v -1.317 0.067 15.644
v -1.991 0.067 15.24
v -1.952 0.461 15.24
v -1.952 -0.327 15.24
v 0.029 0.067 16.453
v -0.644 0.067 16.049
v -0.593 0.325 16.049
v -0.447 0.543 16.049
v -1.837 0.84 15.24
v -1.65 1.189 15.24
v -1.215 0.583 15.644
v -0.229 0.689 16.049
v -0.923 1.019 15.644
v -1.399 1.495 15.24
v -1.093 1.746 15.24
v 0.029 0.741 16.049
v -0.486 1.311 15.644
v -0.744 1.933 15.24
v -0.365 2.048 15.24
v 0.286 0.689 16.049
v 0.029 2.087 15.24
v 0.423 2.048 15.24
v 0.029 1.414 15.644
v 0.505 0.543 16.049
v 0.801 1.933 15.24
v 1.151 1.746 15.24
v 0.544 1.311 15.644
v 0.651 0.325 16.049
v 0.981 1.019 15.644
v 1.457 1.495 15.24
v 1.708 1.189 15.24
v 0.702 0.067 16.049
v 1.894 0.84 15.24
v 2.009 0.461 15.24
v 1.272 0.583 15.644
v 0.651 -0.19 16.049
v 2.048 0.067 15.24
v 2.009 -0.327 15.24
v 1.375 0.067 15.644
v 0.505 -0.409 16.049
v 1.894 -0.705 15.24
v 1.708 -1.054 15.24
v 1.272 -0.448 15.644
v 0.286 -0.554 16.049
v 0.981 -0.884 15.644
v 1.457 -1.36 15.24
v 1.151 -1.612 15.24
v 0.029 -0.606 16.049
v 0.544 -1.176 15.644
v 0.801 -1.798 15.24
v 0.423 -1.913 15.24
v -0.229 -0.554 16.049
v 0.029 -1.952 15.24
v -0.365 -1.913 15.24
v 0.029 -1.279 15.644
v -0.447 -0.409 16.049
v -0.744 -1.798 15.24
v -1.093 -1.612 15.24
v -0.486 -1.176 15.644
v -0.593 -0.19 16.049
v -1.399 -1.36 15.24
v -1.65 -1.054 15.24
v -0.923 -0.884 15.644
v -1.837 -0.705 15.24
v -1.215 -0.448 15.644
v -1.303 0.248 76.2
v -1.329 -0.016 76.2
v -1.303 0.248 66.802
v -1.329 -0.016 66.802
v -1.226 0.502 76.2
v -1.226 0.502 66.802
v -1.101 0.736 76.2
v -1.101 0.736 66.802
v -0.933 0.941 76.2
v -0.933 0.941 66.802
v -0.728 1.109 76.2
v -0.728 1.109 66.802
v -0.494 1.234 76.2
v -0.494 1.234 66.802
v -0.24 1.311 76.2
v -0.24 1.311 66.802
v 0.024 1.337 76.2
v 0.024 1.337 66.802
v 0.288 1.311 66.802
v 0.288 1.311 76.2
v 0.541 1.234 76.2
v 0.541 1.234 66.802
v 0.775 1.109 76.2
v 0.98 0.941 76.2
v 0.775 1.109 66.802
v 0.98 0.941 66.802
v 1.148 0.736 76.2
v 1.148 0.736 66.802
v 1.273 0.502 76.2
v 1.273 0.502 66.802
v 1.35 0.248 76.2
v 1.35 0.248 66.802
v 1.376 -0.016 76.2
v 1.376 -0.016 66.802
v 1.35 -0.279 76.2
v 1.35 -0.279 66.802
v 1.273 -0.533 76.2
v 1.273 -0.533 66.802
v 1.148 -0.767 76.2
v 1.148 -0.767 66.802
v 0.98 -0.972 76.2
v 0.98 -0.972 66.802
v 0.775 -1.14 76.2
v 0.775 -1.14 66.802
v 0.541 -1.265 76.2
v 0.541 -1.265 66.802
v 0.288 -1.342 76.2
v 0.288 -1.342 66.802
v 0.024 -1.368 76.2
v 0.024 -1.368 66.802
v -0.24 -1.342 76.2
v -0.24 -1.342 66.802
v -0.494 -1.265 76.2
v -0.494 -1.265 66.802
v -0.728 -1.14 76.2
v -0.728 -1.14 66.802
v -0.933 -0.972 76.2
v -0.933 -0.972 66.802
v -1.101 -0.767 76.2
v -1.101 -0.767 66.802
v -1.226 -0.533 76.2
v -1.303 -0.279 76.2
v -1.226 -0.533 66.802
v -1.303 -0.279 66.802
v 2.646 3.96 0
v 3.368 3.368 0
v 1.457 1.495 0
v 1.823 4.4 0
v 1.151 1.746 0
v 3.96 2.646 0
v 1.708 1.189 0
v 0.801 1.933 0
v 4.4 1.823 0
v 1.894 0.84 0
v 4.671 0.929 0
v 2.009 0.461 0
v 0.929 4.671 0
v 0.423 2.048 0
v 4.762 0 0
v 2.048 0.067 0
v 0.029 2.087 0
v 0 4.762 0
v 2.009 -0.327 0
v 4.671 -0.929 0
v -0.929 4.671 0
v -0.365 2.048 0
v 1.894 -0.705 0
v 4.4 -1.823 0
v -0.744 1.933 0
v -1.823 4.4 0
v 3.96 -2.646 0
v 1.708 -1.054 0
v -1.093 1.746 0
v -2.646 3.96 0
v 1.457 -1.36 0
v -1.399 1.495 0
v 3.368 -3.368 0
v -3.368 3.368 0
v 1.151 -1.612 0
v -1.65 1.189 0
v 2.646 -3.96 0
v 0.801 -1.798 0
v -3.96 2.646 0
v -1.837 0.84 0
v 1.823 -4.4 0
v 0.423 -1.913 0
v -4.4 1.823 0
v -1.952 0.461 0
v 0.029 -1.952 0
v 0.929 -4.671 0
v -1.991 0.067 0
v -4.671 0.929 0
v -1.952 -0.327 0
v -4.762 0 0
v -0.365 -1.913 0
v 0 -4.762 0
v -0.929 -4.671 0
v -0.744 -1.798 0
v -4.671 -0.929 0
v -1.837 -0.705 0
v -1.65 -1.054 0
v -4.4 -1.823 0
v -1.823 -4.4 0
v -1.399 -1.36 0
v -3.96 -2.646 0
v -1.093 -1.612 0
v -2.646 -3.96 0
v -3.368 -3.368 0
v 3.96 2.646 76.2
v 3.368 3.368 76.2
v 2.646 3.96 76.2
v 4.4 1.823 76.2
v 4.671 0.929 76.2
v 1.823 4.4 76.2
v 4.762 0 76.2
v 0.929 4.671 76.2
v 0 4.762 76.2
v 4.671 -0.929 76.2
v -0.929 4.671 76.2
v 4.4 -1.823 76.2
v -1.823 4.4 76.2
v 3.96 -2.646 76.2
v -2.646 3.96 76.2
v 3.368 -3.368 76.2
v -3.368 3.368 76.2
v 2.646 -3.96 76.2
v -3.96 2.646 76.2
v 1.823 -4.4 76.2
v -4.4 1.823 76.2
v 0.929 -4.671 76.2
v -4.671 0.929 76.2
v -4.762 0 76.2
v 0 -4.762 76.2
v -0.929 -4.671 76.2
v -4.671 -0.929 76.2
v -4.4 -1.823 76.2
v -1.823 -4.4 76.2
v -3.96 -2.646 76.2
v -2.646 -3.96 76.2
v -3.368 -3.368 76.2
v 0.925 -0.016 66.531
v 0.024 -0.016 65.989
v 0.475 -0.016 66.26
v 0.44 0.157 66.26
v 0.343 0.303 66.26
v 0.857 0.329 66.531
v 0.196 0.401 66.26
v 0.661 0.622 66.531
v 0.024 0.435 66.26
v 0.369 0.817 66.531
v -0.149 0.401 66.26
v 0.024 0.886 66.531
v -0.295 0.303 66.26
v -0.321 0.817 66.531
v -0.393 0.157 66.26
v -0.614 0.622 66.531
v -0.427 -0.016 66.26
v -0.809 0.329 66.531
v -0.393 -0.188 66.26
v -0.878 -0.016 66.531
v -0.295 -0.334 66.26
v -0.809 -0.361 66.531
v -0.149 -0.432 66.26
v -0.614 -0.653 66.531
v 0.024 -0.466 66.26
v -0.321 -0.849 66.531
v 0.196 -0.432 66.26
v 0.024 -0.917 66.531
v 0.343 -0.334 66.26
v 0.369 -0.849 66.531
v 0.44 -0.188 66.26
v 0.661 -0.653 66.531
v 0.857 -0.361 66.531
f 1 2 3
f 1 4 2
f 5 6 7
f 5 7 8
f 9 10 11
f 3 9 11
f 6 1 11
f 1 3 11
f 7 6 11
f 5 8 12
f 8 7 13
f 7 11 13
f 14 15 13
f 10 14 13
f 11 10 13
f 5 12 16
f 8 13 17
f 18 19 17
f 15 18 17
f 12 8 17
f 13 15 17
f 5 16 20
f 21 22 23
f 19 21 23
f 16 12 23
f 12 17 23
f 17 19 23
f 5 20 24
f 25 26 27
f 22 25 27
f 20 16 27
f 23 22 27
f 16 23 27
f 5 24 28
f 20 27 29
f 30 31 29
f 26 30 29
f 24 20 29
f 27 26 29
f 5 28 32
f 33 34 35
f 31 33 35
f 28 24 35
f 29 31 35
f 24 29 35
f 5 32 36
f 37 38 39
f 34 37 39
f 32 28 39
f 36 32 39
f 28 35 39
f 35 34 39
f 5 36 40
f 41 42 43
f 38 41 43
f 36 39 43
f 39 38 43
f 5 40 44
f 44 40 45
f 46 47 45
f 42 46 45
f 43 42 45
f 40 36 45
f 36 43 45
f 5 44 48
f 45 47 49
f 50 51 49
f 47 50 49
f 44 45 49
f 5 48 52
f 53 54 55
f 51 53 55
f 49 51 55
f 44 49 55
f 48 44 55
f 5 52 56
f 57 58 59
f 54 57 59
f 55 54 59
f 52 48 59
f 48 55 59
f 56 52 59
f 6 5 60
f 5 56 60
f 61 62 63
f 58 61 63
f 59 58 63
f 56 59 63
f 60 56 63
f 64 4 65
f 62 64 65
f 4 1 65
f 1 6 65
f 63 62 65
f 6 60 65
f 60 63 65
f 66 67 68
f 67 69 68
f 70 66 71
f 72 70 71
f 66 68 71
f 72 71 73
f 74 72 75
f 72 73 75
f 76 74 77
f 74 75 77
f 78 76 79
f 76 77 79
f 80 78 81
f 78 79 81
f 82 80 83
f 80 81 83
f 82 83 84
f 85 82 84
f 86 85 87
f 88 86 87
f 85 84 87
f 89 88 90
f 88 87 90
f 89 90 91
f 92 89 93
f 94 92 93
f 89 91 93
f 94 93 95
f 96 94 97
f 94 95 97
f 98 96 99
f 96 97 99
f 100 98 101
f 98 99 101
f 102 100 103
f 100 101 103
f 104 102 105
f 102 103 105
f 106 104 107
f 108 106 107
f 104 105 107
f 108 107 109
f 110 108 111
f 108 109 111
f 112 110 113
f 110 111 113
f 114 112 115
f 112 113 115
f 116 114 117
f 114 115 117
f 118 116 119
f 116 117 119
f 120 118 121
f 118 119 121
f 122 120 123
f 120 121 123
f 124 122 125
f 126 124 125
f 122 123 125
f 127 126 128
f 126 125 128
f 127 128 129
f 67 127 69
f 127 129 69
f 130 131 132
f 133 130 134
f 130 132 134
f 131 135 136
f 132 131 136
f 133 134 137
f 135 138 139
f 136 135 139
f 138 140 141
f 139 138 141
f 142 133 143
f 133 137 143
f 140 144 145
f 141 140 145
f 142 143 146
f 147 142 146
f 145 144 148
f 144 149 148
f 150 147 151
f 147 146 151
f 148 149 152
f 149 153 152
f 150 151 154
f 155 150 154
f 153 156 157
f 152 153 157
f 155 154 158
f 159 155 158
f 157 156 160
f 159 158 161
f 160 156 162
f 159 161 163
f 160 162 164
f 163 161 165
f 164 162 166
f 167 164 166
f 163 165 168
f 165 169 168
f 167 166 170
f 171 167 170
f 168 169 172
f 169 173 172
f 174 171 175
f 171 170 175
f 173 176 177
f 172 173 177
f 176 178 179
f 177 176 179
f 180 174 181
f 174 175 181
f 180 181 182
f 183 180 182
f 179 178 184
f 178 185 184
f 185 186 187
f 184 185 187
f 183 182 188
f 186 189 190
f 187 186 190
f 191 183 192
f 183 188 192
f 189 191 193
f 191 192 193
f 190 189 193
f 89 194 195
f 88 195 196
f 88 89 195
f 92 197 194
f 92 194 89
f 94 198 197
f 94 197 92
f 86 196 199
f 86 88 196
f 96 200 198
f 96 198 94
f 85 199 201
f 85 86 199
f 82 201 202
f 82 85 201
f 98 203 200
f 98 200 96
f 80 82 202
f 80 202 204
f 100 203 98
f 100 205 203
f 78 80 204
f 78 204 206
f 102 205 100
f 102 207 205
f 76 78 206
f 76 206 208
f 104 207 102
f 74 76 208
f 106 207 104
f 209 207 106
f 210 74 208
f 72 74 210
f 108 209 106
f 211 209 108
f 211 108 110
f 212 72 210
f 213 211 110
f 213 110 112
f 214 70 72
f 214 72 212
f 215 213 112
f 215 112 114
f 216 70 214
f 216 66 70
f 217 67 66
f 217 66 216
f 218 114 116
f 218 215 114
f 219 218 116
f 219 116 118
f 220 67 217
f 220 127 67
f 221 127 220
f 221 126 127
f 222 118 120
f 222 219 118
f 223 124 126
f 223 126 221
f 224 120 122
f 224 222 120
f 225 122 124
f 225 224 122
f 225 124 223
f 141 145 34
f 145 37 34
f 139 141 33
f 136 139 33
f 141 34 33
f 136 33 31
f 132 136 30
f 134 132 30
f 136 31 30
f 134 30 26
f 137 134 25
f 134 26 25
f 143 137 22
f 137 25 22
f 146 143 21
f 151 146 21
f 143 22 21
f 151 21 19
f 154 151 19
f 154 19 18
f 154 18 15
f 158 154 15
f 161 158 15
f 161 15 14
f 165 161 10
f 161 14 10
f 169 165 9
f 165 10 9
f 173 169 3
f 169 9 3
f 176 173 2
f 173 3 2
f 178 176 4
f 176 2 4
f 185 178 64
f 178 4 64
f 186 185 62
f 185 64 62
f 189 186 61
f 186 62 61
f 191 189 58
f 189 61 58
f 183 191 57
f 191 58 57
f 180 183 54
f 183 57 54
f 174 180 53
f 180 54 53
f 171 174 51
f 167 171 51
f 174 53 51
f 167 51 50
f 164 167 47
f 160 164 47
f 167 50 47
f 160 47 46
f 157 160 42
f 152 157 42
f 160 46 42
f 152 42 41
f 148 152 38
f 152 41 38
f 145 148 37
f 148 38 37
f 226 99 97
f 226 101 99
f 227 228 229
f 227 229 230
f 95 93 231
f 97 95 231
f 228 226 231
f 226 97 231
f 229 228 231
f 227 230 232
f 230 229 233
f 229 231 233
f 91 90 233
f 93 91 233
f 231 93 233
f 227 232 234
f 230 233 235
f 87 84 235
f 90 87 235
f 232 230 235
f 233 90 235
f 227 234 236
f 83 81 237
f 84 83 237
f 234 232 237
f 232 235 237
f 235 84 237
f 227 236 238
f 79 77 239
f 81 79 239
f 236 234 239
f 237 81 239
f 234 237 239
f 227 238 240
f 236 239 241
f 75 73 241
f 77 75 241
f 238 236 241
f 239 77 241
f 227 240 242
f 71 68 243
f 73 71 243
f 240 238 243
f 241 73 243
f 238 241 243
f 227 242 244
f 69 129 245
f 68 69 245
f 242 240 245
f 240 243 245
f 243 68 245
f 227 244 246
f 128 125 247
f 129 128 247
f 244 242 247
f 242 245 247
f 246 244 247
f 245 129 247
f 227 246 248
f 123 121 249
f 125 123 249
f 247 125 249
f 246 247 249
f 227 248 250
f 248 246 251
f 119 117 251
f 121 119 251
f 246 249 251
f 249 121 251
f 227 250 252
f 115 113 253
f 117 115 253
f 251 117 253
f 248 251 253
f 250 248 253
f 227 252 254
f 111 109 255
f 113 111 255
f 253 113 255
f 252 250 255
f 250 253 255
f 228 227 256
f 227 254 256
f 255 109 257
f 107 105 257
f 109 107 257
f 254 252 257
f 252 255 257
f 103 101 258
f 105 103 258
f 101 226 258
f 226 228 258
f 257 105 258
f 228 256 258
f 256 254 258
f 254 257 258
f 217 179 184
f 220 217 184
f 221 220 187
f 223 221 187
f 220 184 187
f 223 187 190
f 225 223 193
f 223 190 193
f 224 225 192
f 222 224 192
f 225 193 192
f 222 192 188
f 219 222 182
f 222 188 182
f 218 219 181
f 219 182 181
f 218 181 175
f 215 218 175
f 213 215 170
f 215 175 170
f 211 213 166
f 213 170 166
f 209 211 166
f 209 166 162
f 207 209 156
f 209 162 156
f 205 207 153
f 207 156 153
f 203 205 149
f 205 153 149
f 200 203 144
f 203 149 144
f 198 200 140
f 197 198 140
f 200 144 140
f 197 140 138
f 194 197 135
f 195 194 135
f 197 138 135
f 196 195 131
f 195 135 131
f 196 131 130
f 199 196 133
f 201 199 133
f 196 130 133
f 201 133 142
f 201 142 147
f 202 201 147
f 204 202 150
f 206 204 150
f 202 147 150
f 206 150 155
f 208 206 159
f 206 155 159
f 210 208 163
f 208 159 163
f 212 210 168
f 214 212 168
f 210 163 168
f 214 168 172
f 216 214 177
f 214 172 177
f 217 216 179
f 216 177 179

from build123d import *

# Parameters (mm, degrees)
SKETCH2_R                  = 4.7625
BOSS_EXTRUDE1_DEPTH        = 76.2
F_10_32_TAPPED_HOLE1_D     = 4.0386
F_10_32_TAPPED_HOLE1_DEPTH = 15.24
F_10_32_TAPPED_HOLE1_TIP   = 1.213317848
F_6_32_TAPPED_HOLE1_D      = 2.7051
F_6_32_TAPPED_HOLE1_DEPTH  = 9.398
F_6_32_TAPPED_HOLE1_TIP    = 0.81269403


with BuildPart() as part:
    # Sketch2 → Boss-Extrude1 (new body)
    with BuildSketch(Plane.XY):
        with Locations(Location((0, 0, 0), (0, 0, 180))):
            Circle(SKETCH2_R)
    extrude(amount=BOSS_EXTRUDE1_DEPTH)

    # #10-32 Tapped Hole1
    with Locations(Plane(origin=(0, 0, 0), x_dir=(-1, 0, 0), z_dir=(0, 0, -1))):
        with Locations((-0.028702786, 0.067410108)):
            Hole(F_10_32_TAPPED_HOLE1_D / 2, depth=F_10_32_TAPPED_HOLE1_DEPTH)
            with Locations((0, 0, -(F_10_32_TAPPED_HOLE1_DEPTH + F_10_32_TAPPED_HOLE1_TIP / 2))):  # 118° drill point
                Cone(0, F_10_32_TAPPED_HOLE1_D / 2, F_10_32_TAPPED_HOLE1_TIP, mode=Mode.SUBTRACT)

    # #6-32 Tapped Hole1
    with Locations(Plane.XY.offset(76.2)):
        with Locations((0.02374074, -0.015572073)):
            Hole(F_6_32_TAPPED_HOLE1_D / 2, depth=F_6_32_TAPPED_HOLE1_DEPTH)
            with Locations((0, 0, -(F_6_32_TAPPED_HOLE1_DEPTH + F_6_32_TAPPED_HOLE1_TIP / 2))):  # 118° drill point
                Cone(0, F_6_32_TAPPED_HOLE1_D / 2, F_6_32_TAPPED_HOLE1_TIP, mode=Mode.SUBTRACT)


solid = part.part
